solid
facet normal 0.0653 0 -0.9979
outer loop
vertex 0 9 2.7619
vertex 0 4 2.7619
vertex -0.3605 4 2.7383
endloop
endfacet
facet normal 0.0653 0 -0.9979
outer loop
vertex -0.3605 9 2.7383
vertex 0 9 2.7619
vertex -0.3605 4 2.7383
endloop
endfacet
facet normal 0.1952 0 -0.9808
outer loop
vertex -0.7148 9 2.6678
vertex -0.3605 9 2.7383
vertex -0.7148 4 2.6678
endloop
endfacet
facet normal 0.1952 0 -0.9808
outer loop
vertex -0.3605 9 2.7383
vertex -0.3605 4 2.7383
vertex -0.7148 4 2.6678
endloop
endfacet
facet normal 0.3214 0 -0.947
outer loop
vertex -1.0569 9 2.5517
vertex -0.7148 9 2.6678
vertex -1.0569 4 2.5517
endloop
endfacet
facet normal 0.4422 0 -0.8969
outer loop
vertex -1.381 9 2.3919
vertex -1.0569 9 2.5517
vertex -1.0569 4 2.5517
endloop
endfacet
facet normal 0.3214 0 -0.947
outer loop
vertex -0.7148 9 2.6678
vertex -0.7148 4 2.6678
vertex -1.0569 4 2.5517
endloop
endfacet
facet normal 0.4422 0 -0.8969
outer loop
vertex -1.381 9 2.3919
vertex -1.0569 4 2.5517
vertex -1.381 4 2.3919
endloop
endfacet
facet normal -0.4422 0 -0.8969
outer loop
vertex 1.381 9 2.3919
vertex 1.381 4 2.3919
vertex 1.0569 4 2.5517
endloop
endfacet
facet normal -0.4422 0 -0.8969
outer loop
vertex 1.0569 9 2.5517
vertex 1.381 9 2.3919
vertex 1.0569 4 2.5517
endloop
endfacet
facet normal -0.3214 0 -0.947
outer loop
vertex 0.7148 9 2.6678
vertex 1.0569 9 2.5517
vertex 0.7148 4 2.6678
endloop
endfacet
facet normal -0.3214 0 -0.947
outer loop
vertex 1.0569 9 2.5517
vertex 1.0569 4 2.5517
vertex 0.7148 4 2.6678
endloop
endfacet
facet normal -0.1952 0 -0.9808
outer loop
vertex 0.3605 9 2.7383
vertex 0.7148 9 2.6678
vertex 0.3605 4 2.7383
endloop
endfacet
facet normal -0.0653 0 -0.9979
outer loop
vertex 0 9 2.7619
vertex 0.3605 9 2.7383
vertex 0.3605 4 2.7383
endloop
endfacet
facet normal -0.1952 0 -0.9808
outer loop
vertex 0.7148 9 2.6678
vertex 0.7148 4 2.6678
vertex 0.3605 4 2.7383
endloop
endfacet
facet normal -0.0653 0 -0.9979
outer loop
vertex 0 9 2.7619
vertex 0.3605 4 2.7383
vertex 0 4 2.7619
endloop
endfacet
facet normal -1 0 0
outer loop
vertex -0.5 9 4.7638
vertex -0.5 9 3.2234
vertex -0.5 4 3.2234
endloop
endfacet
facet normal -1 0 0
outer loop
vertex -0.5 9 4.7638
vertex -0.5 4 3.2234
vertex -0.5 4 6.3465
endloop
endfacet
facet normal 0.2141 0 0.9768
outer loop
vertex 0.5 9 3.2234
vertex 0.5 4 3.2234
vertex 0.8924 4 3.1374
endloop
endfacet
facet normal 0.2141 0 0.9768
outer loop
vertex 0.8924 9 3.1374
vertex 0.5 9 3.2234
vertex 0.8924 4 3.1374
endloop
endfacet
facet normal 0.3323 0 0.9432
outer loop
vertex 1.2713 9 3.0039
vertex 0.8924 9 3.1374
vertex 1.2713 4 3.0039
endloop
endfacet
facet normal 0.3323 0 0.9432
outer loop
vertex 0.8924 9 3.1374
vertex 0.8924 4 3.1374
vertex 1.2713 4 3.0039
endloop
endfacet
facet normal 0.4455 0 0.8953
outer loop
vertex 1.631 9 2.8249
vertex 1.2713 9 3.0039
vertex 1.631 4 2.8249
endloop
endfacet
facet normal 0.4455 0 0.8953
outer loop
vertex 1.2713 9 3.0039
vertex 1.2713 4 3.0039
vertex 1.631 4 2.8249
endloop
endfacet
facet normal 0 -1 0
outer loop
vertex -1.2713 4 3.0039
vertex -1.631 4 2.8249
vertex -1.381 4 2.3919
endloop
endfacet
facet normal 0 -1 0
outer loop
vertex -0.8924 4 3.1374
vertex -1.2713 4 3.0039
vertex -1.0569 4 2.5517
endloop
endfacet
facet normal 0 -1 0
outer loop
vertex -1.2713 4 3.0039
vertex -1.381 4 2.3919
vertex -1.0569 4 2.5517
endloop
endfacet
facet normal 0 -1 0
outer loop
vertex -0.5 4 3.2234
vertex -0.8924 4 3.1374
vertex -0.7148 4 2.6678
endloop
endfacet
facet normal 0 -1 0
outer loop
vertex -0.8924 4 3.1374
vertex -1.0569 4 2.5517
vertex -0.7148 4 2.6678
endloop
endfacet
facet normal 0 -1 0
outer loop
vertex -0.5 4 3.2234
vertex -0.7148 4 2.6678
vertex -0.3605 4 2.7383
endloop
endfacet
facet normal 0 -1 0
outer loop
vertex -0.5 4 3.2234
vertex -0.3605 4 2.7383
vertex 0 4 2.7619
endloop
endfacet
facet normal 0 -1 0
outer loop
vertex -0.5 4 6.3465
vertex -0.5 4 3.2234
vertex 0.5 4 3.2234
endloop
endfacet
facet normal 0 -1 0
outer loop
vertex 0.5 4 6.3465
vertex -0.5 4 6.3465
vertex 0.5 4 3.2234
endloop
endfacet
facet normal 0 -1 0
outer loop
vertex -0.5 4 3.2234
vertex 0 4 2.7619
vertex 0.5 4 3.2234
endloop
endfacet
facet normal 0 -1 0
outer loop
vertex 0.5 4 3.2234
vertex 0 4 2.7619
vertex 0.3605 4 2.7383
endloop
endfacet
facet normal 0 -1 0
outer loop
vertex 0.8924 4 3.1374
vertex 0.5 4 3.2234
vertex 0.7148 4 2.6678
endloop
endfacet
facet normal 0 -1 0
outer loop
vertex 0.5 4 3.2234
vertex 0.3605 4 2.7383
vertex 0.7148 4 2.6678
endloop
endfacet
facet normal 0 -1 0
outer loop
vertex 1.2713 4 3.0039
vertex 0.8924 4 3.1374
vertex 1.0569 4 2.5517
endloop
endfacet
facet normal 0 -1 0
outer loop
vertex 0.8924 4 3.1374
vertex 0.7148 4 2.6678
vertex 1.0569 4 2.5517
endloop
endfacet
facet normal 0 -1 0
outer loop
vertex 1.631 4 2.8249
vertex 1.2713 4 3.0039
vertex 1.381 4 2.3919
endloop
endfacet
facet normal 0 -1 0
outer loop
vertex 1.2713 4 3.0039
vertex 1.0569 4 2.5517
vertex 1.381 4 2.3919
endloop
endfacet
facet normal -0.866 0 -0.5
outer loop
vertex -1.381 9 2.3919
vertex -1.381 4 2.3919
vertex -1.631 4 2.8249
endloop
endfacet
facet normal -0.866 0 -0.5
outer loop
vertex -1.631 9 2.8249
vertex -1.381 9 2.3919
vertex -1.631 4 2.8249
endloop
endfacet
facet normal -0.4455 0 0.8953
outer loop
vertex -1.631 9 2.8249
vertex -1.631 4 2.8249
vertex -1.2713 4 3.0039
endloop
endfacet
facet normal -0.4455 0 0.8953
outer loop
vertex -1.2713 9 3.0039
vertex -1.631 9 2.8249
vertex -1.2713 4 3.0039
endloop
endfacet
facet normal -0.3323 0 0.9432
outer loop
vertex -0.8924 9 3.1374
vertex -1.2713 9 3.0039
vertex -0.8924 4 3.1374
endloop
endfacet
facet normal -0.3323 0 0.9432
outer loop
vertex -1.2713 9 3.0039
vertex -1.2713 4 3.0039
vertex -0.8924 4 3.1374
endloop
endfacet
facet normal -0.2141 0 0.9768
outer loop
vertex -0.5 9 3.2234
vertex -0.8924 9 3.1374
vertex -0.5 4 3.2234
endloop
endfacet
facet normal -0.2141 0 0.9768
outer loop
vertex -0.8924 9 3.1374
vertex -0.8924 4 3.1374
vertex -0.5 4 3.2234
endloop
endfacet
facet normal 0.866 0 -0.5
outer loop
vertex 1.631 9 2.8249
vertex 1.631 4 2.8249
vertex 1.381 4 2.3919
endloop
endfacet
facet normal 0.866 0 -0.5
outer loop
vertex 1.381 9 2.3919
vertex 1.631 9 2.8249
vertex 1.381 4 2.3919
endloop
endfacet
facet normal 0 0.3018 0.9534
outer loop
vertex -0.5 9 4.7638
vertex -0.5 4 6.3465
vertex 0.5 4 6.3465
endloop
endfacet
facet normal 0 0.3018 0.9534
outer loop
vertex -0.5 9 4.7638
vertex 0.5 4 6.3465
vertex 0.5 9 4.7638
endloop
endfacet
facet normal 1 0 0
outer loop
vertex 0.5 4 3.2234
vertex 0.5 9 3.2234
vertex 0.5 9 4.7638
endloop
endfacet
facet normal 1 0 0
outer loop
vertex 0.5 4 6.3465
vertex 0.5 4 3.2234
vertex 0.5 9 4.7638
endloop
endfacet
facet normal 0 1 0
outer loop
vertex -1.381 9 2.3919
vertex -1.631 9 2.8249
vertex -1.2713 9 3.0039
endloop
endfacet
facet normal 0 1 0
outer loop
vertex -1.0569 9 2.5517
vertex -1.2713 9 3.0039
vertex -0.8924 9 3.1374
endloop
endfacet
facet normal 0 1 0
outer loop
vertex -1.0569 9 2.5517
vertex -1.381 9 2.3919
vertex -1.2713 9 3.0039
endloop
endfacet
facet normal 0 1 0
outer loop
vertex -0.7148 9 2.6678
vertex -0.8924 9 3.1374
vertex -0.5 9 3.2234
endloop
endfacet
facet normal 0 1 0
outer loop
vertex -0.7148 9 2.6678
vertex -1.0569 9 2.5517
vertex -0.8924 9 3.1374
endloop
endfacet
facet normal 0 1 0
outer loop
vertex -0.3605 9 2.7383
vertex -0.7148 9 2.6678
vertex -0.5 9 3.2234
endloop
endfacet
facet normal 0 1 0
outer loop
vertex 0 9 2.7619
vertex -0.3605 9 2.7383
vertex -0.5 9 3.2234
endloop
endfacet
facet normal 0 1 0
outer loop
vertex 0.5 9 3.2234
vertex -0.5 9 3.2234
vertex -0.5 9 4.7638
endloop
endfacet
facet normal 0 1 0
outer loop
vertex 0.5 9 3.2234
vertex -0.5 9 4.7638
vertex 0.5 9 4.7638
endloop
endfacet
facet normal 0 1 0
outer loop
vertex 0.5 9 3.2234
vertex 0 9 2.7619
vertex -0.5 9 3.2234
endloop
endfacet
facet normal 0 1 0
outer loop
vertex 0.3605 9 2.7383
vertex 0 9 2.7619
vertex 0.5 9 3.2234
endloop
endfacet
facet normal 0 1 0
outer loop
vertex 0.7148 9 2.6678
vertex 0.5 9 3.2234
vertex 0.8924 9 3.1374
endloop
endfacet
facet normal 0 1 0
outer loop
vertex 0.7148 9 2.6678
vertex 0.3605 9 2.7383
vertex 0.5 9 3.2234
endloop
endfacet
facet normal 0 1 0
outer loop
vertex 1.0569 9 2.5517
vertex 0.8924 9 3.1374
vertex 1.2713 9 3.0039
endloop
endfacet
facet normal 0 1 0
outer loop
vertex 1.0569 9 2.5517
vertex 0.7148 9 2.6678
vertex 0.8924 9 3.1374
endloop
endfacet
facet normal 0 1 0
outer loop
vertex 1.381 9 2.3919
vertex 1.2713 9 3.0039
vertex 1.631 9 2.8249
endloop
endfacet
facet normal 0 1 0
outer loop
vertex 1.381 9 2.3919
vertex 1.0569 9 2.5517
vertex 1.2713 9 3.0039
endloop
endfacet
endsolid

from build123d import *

# Parameters (mm, degrees)
BOSS_EXTRUDE1_DEPTH      = 0.5
BOSS_EXTRUDE1_DEPTH_BACK = 0.5
BOSS_EXTRUDE2_DEPTH      = 2.5
BOSS_EXTRUDE2_DEPTH_BACK = 2.5


with BuildPart() as part:
    # Sketch1 → Boss-Extrude1 (new, two sides: drawn at the far end of the back side and taken through both)
    with BuildSketch(Plane(origin=(0, 0, 0), x_dir=(0, 0, -1), z_dir=(1, 0, 0)).offset(-BOSS_EXTRUDE1_DEPTH_BACK)):
        Polygon((-2.836617921, 9), (-3.261901286, 9), (-4.763807052, 9), (-6.346474592, 4), (-3.261901286, 4), (-2.836617921, 4), align=None)
    extrude(amount=BOSS_EXTRUDE1_DEPTH + BOSS_EXTRUDE1_DEPTH_BACK)

    # Sketch2 → Boss-Extrude2 (add, two sides: drawn at the far end of the back side and taken through both)
    with BuildSketch(Plane(origin=(0, 6.5, 0), x_dir=(1, 0, 0), z_dir=(0, 1, 0)).offset(-BOSS_EXTRUDE2_DEPTH_BACK)):
        with BuildLine():
            Line((-1.380950907, -2.391876524), (-1.630950928, -2.824889214))
            ThreePointArc((-1.630950928, -2.824889214), (-0.844242346, -3.150754649), (-2.4e-08, -3.261901286))
            ThreePointArc((-2.4e-08, -3.261901286), (0.8442423, -3.150754662), (1.630950886, -2.824889238))
            Line((1.630950886, -2.824889238), (1.380950907, -2.391876524))
            ThreePointArc((1.380950907, -2.391876524), (0.714832801, -2.667791742), (0, -2.761901286))
            ThreePointArc((0, -2.761901286), (-0.714832801, -2.667791742), (-1.380950907, -2.391876524))
        make_face()
    extrude(amount=BOSS_EXTRUDE2_DEPTH + BOSS_EXTRUDE2_DEPTH_BACK)


solid = part.part
